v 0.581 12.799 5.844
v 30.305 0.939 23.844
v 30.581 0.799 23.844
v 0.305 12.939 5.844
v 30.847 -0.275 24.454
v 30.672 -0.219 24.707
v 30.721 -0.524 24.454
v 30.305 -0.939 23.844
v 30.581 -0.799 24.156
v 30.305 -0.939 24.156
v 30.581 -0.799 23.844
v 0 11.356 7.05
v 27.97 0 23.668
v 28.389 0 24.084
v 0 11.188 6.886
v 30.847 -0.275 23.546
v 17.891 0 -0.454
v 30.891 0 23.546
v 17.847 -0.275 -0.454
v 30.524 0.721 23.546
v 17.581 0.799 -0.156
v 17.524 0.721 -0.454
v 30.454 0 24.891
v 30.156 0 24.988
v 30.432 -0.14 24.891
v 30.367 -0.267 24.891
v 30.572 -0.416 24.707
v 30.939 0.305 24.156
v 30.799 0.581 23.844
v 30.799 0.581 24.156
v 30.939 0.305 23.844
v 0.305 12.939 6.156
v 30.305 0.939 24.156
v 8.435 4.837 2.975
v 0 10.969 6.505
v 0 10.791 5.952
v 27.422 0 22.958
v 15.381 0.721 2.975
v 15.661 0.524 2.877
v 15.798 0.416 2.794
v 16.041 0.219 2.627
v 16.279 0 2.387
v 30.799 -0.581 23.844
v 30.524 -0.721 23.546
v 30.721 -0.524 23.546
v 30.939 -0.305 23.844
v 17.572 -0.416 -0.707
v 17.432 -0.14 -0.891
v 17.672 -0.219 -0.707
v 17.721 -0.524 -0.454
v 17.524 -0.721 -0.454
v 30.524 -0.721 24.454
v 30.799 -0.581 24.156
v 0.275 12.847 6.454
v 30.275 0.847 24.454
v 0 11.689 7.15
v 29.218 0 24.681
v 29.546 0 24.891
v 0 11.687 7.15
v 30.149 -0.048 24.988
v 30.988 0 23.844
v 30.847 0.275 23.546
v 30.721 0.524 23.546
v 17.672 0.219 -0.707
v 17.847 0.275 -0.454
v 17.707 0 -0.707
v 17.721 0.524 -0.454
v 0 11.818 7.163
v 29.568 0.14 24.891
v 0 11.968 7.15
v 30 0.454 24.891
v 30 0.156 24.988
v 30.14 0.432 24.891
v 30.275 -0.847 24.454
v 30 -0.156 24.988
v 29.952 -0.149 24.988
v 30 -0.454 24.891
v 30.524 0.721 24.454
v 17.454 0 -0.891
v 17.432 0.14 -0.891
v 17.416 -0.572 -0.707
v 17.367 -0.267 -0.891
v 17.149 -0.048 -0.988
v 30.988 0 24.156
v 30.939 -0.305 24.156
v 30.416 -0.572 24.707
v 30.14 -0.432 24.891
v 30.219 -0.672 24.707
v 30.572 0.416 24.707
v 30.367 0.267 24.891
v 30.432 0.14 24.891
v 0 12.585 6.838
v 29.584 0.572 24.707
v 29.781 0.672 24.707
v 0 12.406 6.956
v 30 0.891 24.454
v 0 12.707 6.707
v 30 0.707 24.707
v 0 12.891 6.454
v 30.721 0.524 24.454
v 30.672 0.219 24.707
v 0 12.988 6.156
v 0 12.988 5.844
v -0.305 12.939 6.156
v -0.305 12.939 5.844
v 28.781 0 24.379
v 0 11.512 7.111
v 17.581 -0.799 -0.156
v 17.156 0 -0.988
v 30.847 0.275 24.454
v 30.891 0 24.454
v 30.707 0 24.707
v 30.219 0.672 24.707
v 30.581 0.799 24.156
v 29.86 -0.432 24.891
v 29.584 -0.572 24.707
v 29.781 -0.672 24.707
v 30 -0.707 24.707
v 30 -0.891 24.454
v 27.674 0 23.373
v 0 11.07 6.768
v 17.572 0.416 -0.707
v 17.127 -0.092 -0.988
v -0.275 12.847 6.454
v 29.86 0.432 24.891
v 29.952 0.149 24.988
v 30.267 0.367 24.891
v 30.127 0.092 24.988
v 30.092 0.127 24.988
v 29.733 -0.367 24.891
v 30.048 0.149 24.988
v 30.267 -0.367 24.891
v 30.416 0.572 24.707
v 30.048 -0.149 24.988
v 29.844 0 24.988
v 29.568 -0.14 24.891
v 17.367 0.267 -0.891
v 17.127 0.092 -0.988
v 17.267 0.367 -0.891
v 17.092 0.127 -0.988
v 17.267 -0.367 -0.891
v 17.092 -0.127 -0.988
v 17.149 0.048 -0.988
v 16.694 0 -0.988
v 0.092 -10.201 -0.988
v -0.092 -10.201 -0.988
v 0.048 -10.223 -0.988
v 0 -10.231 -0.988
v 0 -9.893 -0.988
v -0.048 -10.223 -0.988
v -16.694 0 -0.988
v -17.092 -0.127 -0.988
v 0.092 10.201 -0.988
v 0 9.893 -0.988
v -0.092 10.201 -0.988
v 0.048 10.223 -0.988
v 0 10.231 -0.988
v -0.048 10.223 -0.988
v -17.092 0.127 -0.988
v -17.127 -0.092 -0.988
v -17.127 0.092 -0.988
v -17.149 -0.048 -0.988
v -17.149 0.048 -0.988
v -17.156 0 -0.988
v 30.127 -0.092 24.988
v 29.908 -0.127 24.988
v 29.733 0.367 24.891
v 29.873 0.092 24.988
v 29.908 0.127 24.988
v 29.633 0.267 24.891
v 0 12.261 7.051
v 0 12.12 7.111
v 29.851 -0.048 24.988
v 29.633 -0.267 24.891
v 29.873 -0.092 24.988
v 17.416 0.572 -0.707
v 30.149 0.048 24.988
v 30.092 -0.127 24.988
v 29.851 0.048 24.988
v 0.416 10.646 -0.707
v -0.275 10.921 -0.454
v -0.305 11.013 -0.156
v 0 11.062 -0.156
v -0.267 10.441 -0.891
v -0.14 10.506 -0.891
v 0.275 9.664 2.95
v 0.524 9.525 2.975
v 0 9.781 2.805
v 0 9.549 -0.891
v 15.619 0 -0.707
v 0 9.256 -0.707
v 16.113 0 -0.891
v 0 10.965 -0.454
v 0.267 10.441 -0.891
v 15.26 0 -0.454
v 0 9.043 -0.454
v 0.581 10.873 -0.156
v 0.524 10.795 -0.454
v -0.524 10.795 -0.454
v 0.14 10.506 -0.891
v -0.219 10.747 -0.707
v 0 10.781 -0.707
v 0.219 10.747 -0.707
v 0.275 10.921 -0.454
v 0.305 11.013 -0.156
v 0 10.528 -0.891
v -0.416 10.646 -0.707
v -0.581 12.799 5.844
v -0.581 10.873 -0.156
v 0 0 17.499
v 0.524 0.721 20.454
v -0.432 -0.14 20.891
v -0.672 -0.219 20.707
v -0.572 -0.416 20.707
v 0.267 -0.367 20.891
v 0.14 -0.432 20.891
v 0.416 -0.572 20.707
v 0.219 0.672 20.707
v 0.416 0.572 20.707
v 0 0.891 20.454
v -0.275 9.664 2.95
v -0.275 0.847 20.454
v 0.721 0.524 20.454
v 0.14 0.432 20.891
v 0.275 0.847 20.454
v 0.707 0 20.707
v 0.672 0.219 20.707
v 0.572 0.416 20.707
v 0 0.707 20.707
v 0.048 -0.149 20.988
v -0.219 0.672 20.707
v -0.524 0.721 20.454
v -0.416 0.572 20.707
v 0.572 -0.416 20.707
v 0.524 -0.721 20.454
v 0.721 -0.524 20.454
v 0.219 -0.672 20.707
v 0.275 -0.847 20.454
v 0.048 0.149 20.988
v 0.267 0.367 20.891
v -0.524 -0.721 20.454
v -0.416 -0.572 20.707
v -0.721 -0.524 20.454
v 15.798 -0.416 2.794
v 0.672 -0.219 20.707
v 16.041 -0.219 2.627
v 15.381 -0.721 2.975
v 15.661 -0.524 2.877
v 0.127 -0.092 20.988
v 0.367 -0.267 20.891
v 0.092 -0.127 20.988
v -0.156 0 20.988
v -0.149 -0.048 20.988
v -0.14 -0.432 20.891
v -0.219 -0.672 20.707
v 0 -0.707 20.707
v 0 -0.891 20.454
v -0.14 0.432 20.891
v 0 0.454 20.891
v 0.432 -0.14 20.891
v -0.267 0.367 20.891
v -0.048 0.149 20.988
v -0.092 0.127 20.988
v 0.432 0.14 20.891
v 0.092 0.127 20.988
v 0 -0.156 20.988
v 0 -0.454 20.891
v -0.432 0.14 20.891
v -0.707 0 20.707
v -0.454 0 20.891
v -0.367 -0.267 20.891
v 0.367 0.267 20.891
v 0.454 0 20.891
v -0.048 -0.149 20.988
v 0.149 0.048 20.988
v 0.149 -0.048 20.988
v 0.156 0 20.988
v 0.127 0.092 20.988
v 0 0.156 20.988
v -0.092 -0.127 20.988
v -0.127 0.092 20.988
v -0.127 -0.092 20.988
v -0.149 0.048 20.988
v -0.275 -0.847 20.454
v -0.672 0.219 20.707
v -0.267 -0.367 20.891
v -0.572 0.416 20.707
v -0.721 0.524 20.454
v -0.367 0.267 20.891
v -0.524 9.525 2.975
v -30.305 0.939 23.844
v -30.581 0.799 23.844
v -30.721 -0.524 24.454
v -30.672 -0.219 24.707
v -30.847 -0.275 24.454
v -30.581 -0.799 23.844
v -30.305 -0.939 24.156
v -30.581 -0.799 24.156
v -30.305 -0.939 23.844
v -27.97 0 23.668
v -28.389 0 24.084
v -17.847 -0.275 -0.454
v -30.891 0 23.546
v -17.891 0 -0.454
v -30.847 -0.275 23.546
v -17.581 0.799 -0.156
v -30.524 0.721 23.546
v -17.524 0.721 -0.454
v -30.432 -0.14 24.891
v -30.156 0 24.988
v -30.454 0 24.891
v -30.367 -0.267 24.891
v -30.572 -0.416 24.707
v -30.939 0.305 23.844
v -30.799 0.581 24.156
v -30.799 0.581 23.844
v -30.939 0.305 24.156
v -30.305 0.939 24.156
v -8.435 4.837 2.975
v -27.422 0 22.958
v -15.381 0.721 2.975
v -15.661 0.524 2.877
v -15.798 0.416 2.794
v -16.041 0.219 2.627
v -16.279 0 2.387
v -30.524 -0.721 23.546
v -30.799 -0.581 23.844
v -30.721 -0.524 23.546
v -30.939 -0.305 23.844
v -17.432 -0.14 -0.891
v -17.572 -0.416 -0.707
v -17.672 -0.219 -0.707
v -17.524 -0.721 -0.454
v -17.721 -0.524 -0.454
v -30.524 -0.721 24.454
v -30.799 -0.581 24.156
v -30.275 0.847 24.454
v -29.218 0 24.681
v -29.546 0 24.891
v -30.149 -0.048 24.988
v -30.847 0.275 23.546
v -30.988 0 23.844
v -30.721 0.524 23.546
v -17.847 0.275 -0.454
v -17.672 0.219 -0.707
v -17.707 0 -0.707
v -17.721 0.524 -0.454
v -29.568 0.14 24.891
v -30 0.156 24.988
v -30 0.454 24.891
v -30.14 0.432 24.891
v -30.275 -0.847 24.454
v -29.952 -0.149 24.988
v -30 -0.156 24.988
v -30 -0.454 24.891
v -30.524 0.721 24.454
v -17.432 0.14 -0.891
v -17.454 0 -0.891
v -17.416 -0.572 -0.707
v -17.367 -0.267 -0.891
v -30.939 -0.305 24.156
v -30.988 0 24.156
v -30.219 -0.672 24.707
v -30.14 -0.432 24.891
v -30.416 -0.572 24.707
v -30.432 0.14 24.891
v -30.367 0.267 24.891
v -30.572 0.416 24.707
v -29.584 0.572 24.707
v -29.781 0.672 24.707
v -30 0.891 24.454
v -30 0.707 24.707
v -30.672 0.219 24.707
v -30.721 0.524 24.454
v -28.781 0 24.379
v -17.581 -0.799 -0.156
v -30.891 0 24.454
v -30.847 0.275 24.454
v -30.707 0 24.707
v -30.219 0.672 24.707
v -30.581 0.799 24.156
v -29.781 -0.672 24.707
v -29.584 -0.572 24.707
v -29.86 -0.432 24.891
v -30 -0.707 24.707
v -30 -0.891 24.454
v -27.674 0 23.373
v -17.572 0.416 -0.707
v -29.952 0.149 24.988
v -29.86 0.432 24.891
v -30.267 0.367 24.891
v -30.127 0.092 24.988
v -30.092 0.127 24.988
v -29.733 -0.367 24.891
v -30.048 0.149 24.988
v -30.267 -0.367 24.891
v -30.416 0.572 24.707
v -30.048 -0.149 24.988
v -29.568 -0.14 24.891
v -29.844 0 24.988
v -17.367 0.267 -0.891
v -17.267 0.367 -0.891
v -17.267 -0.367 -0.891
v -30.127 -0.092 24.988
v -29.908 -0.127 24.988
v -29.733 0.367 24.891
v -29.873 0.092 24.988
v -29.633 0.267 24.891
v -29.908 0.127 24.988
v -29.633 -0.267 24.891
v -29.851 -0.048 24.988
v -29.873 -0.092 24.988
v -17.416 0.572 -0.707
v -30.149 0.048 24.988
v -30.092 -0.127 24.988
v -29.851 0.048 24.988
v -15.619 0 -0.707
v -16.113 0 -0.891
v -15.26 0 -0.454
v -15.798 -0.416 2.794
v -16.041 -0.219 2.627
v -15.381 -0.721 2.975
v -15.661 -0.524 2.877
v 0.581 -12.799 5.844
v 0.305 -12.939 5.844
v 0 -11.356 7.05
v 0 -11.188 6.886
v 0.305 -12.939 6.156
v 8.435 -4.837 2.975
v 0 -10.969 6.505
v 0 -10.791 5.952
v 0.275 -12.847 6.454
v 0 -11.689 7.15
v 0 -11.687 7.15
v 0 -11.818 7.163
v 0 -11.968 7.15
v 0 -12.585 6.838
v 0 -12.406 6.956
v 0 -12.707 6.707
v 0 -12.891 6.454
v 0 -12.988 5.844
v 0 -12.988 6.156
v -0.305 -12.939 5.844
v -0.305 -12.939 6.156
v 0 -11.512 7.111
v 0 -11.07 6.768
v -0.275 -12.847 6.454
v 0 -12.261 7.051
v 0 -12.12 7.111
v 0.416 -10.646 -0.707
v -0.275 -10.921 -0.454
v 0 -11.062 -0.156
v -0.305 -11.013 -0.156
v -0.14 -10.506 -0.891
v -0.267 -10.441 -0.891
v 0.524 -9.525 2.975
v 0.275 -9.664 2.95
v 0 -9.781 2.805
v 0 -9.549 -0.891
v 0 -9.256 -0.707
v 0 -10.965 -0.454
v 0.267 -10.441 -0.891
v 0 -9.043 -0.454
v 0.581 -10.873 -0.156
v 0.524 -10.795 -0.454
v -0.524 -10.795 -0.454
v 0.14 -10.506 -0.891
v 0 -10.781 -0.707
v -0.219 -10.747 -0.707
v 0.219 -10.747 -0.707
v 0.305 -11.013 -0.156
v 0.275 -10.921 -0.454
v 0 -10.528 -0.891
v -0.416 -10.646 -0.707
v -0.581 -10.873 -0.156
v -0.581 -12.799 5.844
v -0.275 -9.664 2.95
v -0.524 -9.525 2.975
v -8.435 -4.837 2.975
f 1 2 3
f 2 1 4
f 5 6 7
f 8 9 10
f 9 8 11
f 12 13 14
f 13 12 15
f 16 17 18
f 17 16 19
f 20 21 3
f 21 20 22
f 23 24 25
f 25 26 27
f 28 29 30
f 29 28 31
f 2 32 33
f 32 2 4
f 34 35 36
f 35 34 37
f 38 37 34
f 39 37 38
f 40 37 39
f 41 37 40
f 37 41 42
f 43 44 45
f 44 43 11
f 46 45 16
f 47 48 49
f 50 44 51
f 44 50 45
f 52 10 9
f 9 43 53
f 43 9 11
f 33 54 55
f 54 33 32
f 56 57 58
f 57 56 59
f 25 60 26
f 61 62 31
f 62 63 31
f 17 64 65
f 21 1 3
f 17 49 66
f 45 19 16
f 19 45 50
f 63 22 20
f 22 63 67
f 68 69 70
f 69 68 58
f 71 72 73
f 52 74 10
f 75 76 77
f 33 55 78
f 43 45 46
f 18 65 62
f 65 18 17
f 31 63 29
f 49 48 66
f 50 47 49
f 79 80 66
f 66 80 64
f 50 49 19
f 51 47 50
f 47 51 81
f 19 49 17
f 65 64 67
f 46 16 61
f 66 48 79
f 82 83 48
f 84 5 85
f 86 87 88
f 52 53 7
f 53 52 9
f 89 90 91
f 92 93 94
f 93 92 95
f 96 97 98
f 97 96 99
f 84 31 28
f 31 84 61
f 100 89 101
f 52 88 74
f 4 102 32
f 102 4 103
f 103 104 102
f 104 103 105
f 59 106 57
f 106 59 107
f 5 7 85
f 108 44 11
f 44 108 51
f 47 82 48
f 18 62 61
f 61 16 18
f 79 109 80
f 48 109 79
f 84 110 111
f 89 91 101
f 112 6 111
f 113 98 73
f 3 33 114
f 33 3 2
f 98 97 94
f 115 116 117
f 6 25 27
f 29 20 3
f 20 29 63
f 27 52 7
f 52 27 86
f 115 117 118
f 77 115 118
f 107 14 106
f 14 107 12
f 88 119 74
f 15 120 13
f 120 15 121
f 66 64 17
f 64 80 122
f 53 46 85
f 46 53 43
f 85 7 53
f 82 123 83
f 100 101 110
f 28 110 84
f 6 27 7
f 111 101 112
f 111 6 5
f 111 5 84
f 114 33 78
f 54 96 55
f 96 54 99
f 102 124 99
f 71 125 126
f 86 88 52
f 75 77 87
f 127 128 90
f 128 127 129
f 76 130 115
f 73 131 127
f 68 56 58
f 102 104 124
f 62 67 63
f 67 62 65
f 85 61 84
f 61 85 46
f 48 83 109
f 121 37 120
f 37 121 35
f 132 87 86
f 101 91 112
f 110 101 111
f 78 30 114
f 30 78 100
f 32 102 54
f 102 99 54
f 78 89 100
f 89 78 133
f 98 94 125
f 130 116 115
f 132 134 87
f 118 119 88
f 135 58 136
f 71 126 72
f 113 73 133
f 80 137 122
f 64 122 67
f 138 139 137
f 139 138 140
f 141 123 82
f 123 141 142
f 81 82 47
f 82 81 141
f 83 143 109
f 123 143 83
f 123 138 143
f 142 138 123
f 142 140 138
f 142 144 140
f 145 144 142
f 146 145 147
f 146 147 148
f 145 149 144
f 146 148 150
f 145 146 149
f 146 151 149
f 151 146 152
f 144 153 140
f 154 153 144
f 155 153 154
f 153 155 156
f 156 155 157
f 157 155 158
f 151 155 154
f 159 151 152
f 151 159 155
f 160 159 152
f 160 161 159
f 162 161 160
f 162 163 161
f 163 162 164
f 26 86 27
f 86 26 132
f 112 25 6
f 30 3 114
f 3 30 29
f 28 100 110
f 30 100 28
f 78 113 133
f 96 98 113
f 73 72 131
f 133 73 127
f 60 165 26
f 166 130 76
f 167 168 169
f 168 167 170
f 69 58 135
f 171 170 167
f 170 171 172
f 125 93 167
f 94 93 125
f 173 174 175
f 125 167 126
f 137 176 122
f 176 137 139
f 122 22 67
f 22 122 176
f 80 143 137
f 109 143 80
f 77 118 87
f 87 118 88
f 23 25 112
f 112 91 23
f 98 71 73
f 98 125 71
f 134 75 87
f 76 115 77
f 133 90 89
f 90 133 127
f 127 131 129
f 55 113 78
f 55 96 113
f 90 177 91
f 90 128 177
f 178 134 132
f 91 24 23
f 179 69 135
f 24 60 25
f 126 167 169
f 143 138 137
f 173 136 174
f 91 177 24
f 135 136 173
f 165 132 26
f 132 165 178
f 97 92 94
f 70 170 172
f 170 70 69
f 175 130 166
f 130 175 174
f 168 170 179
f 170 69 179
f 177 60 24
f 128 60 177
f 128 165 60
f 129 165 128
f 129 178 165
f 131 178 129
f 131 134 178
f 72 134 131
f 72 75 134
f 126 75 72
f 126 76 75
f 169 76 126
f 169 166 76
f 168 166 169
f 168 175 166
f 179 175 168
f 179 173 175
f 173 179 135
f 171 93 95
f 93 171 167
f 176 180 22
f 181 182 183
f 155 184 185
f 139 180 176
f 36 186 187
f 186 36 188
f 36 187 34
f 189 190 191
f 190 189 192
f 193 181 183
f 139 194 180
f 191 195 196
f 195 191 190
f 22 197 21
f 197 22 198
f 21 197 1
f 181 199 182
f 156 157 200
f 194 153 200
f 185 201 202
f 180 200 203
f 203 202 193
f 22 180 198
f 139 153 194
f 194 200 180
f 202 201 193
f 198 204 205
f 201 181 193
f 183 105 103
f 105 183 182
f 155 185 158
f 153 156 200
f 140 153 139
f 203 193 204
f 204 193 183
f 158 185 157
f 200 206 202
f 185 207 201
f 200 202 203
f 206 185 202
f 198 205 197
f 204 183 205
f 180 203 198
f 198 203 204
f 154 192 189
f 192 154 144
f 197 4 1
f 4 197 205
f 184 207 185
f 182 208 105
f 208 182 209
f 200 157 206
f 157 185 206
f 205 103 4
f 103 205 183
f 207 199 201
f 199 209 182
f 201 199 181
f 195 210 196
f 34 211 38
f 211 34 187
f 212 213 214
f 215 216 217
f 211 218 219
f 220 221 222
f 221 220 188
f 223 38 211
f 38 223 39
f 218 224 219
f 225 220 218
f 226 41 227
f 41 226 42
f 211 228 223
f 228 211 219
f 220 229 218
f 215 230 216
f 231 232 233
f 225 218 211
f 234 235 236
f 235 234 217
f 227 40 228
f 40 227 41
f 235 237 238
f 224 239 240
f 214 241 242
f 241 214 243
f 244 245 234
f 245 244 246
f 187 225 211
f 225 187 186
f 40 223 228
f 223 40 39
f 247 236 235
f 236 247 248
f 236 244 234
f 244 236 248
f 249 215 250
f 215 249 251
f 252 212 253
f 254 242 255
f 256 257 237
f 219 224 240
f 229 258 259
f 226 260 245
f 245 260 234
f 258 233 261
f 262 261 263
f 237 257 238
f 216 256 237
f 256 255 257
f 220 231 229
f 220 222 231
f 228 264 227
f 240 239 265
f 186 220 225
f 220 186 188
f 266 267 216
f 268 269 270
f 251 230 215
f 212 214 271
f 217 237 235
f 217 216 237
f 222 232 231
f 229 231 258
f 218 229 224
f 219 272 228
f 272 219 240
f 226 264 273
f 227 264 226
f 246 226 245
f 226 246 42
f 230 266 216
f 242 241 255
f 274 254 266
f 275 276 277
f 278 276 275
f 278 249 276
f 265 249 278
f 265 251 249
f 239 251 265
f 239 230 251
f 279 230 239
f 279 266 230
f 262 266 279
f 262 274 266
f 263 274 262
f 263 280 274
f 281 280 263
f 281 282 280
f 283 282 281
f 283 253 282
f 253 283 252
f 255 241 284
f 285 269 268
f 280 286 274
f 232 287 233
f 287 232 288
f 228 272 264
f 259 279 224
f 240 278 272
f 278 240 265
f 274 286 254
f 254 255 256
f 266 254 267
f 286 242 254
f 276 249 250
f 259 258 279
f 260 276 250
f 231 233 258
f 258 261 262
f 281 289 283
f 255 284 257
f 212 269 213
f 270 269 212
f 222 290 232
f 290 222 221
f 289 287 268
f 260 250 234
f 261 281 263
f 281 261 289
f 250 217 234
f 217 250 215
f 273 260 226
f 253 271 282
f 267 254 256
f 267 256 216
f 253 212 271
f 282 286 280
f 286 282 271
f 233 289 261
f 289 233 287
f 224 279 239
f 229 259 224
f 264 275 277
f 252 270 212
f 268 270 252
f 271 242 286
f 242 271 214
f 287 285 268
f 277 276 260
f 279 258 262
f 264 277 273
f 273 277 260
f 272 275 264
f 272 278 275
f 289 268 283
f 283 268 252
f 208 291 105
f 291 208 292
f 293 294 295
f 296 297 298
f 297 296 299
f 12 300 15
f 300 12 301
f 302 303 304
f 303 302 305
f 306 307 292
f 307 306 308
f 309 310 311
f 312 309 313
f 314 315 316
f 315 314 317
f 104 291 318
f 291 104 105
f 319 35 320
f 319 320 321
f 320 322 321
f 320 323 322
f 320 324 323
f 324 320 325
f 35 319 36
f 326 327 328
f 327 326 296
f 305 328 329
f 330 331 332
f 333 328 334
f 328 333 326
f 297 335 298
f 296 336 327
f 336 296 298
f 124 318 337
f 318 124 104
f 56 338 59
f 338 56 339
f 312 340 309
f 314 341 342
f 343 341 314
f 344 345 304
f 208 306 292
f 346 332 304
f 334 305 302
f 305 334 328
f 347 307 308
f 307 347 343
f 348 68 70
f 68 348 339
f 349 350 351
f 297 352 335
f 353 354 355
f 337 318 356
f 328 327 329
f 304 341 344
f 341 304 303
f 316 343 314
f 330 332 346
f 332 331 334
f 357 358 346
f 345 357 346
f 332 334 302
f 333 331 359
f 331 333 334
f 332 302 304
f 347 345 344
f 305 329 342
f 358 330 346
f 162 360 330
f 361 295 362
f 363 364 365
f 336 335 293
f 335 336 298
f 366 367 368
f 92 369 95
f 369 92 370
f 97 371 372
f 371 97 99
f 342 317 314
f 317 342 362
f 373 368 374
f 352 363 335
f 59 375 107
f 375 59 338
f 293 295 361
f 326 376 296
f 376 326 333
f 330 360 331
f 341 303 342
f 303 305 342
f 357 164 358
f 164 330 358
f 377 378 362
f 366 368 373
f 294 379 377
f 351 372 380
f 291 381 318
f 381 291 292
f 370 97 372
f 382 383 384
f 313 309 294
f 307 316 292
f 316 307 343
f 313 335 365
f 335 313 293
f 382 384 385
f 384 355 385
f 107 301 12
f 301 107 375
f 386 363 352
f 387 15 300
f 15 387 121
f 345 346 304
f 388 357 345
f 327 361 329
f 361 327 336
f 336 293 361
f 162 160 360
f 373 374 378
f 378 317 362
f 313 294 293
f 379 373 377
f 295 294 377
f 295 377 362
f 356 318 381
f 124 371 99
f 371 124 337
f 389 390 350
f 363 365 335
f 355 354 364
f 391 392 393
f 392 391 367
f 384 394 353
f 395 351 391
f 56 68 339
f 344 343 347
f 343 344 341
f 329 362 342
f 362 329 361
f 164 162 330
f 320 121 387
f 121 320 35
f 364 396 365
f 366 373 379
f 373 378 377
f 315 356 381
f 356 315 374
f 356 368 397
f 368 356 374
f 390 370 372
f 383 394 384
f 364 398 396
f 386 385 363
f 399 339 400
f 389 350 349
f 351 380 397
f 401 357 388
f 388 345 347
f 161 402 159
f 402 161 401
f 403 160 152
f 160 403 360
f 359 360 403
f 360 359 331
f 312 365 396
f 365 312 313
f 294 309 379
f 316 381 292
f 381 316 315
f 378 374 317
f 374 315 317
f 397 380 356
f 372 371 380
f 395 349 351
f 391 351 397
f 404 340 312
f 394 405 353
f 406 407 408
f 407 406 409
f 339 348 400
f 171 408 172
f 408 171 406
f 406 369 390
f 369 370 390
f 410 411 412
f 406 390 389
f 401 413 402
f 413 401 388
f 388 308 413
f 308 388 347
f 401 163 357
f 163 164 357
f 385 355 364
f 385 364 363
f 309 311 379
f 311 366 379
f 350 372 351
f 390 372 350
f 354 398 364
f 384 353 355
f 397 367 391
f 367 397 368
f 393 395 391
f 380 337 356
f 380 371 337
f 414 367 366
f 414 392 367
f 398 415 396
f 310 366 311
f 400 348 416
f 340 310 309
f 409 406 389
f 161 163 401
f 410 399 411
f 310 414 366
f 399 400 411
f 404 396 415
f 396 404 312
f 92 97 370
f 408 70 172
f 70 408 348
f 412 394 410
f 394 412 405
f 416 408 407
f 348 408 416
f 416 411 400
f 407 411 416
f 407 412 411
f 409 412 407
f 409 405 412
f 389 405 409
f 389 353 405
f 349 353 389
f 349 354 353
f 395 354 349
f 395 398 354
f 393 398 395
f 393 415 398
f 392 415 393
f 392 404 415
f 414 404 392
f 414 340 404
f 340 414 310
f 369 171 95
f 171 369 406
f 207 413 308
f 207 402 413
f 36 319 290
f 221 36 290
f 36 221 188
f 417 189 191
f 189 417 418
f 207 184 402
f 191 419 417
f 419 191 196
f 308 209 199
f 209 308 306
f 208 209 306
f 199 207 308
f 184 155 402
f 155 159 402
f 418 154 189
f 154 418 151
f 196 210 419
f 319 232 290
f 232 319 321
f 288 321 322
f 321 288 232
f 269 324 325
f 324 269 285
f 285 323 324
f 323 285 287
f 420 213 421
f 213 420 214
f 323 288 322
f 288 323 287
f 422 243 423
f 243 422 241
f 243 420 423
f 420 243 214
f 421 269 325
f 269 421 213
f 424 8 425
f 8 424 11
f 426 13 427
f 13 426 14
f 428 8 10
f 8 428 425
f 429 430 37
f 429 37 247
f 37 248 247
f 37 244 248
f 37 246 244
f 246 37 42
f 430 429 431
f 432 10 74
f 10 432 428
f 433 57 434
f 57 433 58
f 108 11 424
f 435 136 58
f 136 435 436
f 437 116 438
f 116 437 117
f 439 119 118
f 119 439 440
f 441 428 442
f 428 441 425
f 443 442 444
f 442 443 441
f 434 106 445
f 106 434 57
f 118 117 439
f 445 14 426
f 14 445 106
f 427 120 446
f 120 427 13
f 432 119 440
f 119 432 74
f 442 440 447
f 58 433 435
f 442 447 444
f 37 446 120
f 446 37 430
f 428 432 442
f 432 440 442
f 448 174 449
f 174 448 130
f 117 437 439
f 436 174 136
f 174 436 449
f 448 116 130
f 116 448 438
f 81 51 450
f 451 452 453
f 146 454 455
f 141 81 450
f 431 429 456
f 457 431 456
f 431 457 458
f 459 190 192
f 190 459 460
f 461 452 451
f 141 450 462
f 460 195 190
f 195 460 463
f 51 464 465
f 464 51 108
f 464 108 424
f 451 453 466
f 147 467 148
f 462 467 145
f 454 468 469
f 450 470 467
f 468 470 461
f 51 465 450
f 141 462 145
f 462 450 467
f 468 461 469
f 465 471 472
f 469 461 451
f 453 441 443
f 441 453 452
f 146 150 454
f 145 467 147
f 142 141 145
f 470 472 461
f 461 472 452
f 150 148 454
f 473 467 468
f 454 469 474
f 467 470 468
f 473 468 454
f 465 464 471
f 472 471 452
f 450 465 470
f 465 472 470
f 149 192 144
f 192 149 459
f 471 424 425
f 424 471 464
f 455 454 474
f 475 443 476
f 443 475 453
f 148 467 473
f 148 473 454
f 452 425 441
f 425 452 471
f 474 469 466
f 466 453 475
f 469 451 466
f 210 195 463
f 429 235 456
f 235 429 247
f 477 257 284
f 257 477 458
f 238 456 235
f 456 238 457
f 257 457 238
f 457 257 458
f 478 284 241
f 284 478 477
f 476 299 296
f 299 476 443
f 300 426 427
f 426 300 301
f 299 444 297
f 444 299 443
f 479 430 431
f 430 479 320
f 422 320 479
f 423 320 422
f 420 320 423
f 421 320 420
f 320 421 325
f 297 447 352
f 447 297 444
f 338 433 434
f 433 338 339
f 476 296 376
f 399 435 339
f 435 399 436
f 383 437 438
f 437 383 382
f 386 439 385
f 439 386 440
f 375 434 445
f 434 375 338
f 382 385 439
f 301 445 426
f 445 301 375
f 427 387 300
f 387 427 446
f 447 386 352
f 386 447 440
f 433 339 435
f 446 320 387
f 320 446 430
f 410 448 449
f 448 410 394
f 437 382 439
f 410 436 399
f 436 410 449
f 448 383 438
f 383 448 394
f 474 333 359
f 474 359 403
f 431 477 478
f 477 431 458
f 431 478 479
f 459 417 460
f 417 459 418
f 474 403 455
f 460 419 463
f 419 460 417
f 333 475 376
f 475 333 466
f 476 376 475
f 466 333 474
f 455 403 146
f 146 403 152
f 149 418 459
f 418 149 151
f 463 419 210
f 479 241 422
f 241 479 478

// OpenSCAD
/*
   origami ship
   straight sides
   
   Kit Wallace

*/
// length of bow from centre
lb=15; 
// height of bow
hb=12;
// width midships
wm=6; 
// height midships
hm=3; 
// waterline length e.g. from centre eg. half length of bow
wl=8.5; 
// width of hull from centre  - here this is computed so sides has no crease
// wh; 

// height of sail
h=10; 
//Thickness of paper
thickness=1;
// sphere quality
steps = 20;
// overall scale
scale=2;

module double(axis) { 
      union() {
          children();
          mirror(axis) children();
      }
  }
module plane(s,t=0.5) {
    hull()
    for (i=[0:len(s) -1])
       translate(s[i]) sphere(t/2);     
    } 

module ground(size=50) {
   translate([0,0,-size]) cube(2*size,center=true);
}

// functions to make 4 points coplanar - by computing the value of one value so that determinat of matri of 4 points is zero

function det4(m) =
// from http://www.euclideanspace.com/maths/algebra/matrix/functions/determinant/fourD/index.htm
    m[0][3] * m[1][2] * m[2][1] * m[3][0] - m[0][2] * m[1][3] * m[2][1] * m[3][0]- m[0][3] * m[1][1] * m[2][2] * m[3][0]+m[0][1] * m[1][3] * m[2][2] * m[3][0]+ m[0][2] * m[1][1] * m[2][3] * m[3][0]-m[0][1] * m[1][2] * m[2][3] * m[3][0]- m[0][3] * m[1][2] * m[2][0] * m[3][1]+m[0][2] * m[1][3] * m[2][0] * m[3][1]+ m[0][3] * m[1][0] * m[2][2] * m[3][1]-m[0][0] * m[1][3] * m[2][2] * m[3][1]- m[0][2] * m[1][0] * m[2][3] * m[3][1]+m[0][0] * m[1][2] * m[2][3] * m[3][1]+ m[0][3] * m[1][1] * m[2][0] * m[3][2]-m[0][1] * m[1][3] * m[2][0] * m[3][2]- m[0][3] * m[1][0] * m[2][1] * m[3][2]+m[0][0] * m[1][3] * m[2][1] * m[3][2]+ m[0][1] * m[1][0] * m[2][3] * m[3][2]-m[0][0] * m[1][1] * m[2][3] * m[3][2]- m[0][2] * m[1][1] * m[2][0] * m[3][3]+m[0][1] * m[1][2] * m[2][0] * m[3][3]+ m[0][2] * m[1][0] * m[2][1] * m[3][3]-m[0][0] * m[1][2] * m[2][1] * m[3][3]- m[0][1] * m[1][0] * m[2][2] * m[3][3]+m[0][0] * m[1][1] * m[2][2] * m[3][3];

// to iteratively solve det(x) = -
function secant(xn,xn1,eps=0.001) =
     let(fxn=f(xn))
     let(fxn1=f(xn1))
     let(x = xn - fxn*(xn - xn1)/ (fxn - fxn1))
     abs(f(x) - fxn) < eps
        ? x
        : secant(x,xn,eps);
 

p1=[lb,0,hb];
p2=[wl,0,0];
p3=[0,wm,hm];
p5=[0,0,h];

function f(x) = 
 let(m = [  
       [lb,0,hb,1],
       [wl,0,0,1],
       [0,wm,hm,1],
       [0,x,0,1]]
     )
  det4(m);
  
wh= secant(0,wm);
echo(wh);

p4=[0,wh,0];

module ship_q(t) {
   plane([p1,p2,p3],t);
   plane([p2,p3,p4],t);
   plane([p4,p2,p5],t);
};

$fn=steps;
scale(scale) 
 difference() {
  double([0,1,0]) 
     double([1,0,0]) 
         ship_q(thickness); 
 * ground();
 }
